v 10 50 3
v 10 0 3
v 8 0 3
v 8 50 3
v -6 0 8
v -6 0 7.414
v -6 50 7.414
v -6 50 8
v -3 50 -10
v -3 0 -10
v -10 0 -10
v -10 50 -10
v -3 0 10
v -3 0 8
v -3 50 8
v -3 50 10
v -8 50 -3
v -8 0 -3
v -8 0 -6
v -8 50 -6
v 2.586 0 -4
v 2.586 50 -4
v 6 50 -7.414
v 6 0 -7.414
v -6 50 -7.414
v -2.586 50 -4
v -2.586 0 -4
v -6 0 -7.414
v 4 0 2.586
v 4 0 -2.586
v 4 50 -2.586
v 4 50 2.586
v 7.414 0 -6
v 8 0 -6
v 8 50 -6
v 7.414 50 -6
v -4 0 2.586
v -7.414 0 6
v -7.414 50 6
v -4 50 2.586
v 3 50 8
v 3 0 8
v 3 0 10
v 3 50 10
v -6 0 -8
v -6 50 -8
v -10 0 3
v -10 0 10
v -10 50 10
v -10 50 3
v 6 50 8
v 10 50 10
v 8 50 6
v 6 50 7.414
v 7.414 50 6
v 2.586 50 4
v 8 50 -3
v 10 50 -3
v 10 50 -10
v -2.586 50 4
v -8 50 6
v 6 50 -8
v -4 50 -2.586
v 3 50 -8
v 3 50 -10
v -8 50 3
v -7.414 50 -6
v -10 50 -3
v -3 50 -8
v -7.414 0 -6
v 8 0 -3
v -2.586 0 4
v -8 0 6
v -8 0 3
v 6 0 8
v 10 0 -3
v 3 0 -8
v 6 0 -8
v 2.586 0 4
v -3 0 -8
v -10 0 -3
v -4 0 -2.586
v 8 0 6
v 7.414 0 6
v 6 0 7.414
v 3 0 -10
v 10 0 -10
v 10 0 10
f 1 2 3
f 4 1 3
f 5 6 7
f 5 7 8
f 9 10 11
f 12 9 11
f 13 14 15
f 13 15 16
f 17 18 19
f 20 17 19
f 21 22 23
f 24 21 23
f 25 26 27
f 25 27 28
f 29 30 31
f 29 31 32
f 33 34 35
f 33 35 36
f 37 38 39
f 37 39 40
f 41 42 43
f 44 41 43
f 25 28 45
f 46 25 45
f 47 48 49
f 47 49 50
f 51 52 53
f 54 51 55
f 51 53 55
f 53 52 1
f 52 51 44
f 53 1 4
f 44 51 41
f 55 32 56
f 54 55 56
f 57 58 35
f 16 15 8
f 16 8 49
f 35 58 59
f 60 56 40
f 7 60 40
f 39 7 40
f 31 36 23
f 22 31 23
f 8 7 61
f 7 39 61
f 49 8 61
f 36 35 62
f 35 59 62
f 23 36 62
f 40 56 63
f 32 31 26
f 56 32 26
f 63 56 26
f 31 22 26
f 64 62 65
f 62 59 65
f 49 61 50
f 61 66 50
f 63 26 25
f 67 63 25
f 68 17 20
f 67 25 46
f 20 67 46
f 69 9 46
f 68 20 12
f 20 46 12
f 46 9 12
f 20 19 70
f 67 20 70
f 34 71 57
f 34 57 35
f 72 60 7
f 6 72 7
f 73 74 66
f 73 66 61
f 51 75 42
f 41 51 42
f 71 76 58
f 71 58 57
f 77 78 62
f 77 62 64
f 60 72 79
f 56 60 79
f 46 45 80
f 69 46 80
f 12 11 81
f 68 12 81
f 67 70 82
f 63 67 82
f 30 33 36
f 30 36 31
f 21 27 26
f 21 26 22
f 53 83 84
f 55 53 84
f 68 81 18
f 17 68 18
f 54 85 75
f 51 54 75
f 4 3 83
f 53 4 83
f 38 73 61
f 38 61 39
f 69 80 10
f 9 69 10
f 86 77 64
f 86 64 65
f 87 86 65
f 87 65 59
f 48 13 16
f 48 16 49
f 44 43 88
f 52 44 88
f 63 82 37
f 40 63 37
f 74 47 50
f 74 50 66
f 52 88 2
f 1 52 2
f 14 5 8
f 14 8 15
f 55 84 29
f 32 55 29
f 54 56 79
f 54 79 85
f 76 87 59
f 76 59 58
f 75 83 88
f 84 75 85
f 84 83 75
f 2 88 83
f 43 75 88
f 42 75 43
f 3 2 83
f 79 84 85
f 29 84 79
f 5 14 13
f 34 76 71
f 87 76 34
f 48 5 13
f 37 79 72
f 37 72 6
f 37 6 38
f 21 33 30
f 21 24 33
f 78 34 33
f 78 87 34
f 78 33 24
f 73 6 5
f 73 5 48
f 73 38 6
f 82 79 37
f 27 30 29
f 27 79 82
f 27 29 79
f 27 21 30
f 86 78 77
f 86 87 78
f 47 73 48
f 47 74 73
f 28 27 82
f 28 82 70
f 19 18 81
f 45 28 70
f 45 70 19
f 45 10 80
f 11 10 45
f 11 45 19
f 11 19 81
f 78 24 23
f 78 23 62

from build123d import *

# Parameters (mm, degrees)
F1_DEPTH = 50


with BuildPart() as f1:
    # F0 (on Front) → F1 (new body)
    with BuildSketch(Plane.XZ):
        Polygon((0, 0), (0, 4), (-2.585786, 4), (-6, 7.414214), (-6, 8), (-3, 8), (-3, 10), (-10, 10), (-10, 3), (-8, 3), (-8, 6), (-7.414214, 6), (-4, 2.585786), (-4, 0), align=None)
    extrude(amount=-F1_DEPTH)

    # F2: F1 across face


with BuildPart() as f1_1:
    add(f1.part)
    add(f1.part.mirror(Plane(origin=(0, 25, 2), x_dir=(0, 1, 0), z_dir=(1, 0, 0))))

    # F3: F1 across face


with BuildPart() as f1_2:
    add(f1_1.part)
    add(f1_1.part.mirror(Plane(origin=(0, 25, 0), x_dir=(1, 0, 0), z_dir=(0, 0, -1))))


solid = f1_2.part
